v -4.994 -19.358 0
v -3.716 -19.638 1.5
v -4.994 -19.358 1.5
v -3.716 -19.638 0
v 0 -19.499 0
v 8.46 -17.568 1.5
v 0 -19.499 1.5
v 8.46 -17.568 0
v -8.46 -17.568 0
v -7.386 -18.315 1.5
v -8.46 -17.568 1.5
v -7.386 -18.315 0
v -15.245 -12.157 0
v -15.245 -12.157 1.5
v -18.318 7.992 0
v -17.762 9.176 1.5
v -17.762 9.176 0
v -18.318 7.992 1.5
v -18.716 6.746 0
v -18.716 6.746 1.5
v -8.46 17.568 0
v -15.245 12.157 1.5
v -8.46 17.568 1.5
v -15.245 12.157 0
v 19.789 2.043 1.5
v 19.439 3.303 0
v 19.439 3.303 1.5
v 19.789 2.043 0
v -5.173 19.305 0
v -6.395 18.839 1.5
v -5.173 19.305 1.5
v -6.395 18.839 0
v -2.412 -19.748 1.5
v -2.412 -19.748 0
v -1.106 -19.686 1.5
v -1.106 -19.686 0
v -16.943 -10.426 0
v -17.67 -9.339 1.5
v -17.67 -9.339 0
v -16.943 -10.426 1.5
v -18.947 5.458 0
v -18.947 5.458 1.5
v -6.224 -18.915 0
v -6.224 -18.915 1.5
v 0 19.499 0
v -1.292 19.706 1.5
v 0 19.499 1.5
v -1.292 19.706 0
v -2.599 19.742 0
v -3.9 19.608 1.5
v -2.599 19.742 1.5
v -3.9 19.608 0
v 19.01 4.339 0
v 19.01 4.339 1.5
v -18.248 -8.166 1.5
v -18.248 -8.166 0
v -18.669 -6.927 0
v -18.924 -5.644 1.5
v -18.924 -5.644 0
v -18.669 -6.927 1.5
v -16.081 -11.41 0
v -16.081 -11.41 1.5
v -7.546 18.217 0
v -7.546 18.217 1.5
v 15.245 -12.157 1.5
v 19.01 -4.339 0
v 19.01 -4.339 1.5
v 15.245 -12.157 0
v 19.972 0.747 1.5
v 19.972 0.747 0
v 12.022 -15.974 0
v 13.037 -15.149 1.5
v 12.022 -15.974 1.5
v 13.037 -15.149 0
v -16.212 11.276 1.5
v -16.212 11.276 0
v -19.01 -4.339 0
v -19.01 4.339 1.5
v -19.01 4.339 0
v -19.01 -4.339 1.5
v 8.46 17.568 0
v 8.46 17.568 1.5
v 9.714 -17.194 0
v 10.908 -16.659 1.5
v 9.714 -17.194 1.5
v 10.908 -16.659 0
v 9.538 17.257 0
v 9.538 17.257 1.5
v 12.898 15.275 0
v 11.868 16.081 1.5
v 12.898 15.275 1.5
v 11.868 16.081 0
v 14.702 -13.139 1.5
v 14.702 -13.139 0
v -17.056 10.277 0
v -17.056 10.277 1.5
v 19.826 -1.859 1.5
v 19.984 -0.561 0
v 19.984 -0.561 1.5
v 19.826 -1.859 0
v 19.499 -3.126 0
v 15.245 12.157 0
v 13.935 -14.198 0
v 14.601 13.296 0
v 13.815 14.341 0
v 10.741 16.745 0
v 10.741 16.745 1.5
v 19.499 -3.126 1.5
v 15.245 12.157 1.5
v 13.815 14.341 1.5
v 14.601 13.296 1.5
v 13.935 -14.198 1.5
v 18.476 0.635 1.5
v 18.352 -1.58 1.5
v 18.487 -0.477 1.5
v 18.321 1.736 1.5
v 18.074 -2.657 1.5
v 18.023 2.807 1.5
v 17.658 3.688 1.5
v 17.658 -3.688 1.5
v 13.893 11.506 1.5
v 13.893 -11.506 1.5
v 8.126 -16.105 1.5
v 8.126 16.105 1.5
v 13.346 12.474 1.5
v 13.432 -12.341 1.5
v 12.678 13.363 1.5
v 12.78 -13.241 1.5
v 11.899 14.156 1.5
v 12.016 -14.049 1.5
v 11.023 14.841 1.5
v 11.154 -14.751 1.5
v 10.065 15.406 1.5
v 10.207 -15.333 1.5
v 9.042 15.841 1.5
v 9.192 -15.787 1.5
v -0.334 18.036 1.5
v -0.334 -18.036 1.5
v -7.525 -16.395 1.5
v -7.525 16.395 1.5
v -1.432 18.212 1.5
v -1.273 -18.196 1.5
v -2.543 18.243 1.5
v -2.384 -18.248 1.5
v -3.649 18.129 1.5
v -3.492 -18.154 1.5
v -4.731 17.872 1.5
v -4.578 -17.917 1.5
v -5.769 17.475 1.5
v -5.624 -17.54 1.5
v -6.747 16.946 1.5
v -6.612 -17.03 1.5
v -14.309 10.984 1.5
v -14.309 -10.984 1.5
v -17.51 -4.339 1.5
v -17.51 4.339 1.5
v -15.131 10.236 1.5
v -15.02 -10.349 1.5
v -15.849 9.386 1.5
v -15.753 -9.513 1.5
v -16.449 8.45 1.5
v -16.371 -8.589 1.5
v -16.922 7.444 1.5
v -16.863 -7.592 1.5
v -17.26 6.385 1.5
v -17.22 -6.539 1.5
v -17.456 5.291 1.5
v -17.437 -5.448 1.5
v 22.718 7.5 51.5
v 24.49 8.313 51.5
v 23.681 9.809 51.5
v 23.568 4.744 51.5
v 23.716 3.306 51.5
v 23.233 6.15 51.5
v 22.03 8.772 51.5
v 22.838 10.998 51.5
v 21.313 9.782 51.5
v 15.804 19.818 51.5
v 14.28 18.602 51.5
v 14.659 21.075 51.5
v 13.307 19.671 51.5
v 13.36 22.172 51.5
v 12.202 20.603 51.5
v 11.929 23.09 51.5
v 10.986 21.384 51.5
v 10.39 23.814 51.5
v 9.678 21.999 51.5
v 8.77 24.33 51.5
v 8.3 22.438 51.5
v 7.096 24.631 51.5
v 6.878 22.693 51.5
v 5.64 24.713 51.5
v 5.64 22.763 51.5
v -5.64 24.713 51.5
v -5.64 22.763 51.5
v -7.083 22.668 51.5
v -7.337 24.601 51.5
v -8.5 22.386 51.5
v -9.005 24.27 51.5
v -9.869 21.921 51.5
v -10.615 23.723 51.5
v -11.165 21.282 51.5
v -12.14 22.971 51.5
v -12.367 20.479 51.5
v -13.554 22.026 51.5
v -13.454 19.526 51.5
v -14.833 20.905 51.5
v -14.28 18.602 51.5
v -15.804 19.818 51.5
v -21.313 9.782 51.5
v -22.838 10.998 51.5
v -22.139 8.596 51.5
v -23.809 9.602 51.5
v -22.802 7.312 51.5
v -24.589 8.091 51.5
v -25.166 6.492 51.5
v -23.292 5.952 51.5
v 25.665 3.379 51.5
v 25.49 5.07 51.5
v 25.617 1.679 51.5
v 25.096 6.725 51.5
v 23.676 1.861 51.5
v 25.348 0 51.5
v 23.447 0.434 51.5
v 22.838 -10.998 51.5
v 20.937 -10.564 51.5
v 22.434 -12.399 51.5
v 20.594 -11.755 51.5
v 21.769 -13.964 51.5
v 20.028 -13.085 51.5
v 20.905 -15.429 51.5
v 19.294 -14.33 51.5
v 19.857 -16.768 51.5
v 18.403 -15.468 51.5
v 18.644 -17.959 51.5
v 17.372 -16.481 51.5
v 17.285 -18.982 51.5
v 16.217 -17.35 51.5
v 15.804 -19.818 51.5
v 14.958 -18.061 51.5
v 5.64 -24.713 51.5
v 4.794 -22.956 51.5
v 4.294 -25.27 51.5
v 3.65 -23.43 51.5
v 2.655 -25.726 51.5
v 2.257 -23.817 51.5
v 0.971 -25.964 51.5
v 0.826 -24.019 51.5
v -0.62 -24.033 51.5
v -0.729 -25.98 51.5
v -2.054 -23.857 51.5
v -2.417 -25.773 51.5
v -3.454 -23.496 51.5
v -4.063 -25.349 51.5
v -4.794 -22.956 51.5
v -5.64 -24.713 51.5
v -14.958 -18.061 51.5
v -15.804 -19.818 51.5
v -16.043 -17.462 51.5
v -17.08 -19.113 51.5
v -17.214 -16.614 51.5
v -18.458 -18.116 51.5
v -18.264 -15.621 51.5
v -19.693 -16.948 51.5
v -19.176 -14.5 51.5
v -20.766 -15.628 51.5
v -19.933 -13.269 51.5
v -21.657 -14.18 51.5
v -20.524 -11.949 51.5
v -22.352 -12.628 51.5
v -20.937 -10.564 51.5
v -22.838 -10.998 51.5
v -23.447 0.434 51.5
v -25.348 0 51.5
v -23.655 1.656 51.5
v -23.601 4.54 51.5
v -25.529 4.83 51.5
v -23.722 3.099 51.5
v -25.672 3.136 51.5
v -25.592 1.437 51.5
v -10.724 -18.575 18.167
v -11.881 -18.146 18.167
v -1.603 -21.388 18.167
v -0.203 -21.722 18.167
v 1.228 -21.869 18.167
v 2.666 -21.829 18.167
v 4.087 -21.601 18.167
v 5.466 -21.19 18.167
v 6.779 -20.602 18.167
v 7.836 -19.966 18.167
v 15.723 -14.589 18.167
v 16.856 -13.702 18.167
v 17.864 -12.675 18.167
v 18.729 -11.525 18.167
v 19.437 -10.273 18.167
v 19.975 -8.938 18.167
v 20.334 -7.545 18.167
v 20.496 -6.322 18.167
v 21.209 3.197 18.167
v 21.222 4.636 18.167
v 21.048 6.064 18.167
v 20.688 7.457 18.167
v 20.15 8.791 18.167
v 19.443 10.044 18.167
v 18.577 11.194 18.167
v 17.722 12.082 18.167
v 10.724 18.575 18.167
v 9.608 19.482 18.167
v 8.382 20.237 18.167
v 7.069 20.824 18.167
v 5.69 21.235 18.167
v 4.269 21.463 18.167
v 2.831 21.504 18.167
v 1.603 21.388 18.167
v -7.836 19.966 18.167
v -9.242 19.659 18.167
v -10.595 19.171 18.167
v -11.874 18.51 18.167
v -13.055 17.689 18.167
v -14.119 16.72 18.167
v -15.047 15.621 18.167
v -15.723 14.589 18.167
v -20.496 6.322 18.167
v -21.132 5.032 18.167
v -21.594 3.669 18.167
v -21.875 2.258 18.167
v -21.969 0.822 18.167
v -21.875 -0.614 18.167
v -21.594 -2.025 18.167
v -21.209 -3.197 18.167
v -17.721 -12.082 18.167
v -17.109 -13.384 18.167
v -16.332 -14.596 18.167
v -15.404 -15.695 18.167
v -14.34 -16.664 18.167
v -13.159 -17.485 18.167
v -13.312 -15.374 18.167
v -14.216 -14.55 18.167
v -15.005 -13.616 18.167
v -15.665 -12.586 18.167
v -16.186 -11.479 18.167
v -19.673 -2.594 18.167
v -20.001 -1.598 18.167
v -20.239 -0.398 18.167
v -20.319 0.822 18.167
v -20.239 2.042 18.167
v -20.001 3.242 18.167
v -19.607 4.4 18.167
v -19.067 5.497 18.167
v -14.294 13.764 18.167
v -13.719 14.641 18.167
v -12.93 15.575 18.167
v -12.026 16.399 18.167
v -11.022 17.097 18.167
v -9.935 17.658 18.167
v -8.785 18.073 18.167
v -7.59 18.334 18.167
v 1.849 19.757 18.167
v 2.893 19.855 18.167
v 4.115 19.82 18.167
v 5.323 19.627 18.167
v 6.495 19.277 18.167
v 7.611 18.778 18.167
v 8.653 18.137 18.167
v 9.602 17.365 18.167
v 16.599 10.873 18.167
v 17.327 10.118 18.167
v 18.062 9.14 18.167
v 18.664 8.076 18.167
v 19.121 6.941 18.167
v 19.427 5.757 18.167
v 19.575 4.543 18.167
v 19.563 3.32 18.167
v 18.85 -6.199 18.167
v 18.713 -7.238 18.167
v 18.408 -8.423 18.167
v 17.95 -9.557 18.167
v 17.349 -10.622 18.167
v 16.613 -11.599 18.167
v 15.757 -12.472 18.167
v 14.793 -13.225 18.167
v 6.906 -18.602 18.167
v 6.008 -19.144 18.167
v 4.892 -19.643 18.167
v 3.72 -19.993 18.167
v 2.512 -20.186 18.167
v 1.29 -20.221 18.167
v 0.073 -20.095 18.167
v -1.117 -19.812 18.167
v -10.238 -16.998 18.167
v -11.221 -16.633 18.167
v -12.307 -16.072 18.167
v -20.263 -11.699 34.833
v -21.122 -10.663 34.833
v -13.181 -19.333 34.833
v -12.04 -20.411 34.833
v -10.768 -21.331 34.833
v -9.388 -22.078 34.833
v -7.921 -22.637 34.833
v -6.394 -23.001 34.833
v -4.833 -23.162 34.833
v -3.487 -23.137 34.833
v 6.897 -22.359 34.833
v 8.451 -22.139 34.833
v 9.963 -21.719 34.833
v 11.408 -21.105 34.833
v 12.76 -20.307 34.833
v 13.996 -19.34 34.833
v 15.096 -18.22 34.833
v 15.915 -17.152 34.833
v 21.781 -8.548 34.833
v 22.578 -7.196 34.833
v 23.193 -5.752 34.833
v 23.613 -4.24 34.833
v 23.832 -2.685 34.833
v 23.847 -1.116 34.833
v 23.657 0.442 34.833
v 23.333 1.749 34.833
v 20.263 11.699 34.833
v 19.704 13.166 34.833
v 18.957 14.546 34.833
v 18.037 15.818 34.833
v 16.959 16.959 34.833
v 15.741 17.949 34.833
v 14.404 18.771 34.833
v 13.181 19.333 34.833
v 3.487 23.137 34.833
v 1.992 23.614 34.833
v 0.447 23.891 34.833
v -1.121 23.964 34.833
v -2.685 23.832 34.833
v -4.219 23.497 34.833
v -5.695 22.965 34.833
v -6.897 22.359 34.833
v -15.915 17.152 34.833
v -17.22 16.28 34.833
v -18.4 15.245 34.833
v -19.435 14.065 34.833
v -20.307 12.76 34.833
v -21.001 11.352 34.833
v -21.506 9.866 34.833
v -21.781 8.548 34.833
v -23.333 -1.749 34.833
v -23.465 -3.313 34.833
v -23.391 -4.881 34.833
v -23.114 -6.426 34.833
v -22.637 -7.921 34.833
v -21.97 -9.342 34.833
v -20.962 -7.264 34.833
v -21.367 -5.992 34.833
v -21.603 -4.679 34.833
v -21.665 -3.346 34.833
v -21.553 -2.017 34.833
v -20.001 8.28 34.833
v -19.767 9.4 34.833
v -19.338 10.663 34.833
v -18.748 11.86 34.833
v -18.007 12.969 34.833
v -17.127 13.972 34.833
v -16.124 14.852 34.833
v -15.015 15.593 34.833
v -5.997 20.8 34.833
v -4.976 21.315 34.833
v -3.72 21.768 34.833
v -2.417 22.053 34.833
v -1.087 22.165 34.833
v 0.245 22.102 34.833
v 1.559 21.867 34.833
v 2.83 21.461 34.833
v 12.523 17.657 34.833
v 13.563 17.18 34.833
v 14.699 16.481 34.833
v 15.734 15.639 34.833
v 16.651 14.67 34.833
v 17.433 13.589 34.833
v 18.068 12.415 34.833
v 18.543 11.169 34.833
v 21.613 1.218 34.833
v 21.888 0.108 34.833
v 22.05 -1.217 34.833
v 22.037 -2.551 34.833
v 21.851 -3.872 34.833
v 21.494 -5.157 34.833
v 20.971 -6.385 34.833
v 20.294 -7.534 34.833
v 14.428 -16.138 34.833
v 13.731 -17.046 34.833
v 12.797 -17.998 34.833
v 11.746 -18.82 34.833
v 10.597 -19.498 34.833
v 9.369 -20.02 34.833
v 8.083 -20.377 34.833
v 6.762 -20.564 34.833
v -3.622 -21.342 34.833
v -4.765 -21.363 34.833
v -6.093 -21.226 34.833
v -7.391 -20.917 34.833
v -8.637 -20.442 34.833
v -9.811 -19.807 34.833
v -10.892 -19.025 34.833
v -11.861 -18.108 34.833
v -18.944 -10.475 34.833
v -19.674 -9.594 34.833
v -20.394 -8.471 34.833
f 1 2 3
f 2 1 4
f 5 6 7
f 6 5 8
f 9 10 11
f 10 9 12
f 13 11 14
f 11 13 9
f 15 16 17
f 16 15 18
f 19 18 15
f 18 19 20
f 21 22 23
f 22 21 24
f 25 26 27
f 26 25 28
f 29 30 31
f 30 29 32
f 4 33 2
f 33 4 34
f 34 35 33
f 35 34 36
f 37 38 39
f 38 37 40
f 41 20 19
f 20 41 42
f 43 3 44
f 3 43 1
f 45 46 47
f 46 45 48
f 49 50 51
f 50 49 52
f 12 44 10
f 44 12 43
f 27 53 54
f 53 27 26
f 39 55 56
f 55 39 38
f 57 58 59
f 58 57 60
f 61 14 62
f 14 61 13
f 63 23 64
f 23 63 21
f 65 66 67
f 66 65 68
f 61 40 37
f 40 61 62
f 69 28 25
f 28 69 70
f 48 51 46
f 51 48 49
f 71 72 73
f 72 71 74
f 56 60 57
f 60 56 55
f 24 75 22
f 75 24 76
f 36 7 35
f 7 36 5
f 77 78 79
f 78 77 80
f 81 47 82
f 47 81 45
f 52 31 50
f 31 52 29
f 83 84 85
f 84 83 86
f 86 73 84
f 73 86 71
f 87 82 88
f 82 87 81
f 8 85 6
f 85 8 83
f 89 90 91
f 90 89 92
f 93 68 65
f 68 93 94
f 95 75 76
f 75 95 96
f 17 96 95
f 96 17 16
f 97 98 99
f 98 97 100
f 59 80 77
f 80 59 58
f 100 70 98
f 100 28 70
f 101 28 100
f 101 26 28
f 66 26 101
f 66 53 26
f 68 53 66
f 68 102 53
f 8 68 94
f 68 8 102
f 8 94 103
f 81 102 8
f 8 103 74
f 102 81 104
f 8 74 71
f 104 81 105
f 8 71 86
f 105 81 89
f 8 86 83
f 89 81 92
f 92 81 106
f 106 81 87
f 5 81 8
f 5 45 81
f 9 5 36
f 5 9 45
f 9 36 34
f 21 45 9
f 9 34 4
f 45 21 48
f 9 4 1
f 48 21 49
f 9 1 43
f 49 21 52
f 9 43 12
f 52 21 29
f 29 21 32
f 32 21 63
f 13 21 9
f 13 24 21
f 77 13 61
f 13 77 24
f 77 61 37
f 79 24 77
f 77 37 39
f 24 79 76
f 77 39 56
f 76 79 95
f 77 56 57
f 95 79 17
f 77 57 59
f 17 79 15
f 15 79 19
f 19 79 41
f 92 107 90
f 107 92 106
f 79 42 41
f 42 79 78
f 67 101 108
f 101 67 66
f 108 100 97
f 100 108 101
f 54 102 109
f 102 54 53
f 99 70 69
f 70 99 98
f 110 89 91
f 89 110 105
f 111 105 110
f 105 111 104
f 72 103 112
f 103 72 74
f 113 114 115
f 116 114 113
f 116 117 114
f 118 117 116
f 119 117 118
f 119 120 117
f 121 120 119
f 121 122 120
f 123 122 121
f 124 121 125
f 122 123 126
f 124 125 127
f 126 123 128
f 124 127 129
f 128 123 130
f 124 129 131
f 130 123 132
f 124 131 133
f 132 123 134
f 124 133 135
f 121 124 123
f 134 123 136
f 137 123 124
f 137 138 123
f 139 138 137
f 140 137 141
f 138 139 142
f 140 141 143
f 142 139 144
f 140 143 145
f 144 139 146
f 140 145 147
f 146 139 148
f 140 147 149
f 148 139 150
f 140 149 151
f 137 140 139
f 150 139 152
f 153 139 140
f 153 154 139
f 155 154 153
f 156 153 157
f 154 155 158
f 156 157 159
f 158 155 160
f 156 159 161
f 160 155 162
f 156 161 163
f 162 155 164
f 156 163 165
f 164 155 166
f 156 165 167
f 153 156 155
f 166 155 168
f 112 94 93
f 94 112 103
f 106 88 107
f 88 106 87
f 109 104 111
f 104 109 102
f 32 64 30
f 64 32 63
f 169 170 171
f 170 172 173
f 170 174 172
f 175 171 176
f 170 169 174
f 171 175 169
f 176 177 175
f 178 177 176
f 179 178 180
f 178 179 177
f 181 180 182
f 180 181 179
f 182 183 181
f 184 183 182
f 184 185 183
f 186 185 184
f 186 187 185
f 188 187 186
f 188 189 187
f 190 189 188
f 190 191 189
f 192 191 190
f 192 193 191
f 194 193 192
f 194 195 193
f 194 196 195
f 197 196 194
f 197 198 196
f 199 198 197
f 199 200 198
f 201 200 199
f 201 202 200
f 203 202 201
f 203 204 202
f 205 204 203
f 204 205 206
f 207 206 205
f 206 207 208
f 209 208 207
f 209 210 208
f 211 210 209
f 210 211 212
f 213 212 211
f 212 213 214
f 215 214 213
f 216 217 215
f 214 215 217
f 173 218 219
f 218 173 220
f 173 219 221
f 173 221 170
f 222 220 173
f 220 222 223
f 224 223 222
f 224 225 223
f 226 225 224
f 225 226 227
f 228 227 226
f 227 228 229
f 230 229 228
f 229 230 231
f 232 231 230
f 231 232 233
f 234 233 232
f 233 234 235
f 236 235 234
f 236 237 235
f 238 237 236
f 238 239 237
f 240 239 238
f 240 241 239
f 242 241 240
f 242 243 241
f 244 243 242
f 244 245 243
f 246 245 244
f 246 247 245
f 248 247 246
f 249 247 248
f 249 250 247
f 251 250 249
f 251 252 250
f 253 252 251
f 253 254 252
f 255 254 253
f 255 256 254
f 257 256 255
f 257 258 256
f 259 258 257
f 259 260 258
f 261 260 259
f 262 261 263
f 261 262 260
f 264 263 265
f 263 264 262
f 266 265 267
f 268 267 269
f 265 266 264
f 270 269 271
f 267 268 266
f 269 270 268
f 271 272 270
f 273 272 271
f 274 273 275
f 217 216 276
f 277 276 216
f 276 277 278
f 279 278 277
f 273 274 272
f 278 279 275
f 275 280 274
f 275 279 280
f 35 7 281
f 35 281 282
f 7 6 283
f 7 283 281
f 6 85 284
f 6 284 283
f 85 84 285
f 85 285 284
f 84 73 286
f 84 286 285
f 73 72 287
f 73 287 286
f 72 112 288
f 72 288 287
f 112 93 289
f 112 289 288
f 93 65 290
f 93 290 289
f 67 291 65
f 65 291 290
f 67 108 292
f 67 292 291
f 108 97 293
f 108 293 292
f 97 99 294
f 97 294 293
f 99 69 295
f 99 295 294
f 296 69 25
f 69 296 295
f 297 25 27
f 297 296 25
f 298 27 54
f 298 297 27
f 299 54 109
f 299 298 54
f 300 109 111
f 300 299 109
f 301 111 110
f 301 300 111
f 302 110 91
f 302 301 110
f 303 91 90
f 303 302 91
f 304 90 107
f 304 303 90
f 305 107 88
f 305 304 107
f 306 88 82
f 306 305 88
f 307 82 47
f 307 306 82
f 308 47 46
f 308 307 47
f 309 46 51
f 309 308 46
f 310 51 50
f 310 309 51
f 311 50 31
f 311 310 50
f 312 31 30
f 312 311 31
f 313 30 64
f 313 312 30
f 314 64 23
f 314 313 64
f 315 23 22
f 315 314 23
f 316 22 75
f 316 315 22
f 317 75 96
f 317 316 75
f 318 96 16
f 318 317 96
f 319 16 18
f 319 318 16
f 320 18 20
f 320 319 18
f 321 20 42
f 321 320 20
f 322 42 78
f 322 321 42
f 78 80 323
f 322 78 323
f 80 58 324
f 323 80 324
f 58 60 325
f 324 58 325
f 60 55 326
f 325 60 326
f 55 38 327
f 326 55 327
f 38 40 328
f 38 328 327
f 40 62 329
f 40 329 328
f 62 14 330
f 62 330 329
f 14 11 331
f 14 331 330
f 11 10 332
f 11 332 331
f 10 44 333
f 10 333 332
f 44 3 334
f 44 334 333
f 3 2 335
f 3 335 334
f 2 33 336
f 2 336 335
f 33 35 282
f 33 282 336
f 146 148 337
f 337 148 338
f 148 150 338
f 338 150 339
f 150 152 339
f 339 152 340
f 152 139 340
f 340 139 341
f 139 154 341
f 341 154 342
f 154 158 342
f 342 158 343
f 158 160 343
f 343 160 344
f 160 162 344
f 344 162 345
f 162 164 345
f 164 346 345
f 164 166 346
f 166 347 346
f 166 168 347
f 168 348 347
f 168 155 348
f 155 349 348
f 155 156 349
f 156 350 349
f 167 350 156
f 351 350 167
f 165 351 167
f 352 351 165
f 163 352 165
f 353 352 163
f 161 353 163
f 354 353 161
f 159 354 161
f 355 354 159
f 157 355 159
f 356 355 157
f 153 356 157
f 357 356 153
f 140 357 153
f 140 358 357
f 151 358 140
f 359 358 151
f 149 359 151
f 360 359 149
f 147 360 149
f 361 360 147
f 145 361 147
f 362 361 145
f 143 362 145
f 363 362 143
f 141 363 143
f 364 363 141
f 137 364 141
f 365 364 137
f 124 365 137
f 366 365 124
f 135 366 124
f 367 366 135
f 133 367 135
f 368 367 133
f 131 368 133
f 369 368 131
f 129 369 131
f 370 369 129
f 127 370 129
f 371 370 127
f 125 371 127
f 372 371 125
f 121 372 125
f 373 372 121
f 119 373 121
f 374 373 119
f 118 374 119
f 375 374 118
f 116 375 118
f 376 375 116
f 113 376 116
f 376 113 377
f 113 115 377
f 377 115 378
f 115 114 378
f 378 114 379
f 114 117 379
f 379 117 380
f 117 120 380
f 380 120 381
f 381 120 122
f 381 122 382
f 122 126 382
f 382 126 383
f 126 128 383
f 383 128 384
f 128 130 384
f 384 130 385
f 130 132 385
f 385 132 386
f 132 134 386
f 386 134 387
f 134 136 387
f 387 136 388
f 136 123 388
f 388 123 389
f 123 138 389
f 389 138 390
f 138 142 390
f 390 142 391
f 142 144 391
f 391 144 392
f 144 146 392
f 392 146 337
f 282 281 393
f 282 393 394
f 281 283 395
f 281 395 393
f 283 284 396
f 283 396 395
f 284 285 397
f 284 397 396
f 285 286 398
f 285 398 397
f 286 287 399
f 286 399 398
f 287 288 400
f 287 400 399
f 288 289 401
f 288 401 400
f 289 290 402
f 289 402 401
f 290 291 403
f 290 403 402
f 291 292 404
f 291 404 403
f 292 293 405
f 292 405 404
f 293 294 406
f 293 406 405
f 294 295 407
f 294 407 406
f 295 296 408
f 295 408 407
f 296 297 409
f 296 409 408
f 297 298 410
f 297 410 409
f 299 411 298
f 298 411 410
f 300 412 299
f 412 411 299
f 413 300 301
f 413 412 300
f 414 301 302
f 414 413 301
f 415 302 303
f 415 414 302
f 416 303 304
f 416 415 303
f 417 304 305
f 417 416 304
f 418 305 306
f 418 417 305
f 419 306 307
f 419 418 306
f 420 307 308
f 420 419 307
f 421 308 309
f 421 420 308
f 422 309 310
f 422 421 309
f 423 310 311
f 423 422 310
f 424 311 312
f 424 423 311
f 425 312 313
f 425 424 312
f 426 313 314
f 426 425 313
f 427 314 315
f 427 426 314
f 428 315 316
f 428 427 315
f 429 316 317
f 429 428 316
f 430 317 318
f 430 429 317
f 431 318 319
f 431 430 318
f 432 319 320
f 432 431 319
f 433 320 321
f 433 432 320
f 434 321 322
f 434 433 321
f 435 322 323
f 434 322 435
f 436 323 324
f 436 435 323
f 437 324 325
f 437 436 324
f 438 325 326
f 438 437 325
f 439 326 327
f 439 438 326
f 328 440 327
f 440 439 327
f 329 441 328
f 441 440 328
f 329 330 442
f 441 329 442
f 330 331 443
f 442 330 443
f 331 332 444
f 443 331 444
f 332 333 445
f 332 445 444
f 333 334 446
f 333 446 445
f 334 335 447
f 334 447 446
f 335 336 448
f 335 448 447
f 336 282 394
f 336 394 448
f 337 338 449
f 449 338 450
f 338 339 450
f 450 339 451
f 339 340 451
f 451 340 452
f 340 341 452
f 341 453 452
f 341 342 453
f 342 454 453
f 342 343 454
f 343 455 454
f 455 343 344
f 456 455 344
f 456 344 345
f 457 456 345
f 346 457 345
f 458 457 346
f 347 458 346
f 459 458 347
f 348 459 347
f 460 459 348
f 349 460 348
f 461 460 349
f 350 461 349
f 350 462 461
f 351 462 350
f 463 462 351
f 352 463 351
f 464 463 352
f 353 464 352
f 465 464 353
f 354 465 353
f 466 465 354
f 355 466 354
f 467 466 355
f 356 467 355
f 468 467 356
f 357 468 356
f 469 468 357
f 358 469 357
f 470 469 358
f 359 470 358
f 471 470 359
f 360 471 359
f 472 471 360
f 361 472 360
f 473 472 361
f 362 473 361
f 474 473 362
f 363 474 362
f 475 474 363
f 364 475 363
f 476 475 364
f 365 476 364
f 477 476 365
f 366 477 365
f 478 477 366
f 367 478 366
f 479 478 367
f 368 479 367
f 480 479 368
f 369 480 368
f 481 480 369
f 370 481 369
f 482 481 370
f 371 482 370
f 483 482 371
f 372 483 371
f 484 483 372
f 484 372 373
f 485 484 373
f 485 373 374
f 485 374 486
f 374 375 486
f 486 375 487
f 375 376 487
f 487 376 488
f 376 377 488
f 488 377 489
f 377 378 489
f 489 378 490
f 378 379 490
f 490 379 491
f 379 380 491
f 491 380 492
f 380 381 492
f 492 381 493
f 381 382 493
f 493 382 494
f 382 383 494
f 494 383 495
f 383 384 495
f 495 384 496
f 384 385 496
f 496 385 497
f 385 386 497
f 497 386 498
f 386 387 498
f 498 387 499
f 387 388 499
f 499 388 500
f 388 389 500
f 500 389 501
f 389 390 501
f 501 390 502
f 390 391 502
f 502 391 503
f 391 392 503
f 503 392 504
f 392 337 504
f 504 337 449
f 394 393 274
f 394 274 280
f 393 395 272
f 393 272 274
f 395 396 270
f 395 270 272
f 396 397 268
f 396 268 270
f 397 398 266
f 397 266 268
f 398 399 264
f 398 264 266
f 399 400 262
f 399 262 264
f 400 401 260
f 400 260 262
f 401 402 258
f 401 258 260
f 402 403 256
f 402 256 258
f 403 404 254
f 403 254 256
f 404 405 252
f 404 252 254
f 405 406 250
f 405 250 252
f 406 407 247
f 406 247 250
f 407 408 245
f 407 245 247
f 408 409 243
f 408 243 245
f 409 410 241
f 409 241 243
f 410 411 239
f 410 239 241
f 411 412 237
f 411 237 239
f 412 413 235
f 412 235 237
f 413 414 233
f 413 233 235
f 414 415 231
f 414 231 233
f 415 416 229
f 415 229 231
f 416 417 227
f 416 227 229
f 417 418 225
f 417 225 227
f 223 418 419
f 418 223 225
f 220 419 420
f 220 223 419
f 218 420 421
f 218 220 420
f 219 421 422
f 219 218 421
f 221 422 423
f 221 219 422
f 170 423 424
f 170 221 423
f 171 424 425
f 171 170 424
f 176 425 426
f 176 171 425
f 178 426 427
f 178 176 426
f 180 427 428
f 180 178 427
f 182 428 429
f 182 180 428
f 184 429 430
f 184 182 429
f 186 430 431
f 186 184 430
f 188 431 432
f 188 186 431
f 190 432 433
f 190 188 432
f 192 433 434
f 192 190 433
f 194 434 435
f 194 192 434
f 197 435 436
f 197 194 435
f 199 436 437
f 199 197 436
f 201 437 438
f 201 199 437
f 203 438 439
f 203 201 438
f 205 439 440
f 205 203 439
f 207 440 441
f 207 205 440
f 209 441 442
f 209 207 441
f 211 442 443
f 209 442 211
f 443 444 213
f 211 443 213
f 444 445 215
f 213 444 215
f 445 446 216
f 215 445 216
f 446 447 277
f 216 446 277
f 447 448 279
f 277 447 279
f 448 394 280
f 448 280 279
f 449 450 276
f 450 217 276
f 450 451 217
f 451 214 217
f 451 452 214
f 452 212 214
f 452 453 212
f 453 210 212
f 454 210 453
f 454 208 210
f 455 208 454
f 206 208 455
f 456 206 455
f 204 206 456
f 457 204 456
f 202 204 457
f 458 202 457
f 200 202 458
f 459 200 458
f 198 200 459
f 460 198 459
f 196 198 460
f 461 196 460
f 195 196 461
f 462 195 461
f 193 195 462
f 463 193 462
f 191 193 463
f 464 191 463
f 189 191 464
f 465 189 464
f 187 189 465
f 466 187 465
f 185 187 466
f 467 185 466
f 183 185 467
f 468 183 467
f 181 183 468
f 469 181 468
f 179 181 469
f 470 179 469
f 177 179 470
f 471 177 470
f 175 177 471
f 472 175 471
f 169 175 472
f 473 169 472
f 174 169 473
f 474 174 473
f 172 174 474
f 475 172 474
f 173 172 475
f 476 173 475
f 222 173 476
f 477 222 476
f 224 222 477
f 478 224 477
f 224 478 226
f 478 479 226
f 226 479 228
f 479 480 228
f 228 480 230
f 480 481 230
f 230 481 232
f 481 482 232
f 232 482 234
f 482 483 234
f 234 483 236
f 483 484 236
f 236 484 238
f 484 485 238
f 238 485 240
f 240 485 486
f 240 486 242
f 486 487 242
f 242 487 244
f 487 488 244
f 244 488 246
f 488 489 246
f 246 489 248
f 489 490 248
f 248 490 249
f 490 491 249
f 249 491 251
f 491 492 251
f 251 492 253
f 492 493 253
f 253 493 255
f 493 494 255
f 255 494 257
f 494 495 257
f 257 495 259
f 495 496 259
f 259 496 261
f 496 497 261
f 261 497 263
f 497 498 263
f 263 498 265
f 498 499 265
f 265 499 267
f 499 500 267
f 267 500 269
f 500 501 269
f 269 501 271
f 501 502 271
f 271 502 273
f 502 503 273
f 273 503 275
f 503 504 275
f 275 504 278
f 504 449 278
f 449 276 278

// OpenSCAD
//Simple Bowl

radius = 10;//bowl radius
side = 7;//bowl side
hole = 5.5;
//take away soild's thickness
thickness = side - hole;

h = 50;
//body height

BodyS = "no";
BaseS = "yes";
//inside soild="yes" or "no"

bodyTwist = 90;
//twist angle

bodySlices = 3;
//smoothe

bodyScale = 1.3;
//scale

baseHeight = 1.5;



//$fn : fixed number of fragments in 360 degrees.

//Offset allows moving 2D outlines outward or inward by a given amount.

/////////////////////////////////
//Render

//Base
linear_extrude(height = baseHeight)
{
    Bowl(BaseS);
}

//Body
translate([0,0,baseHeight])
  linear_extrude(height = h , twist =  bodyTwist ,slices = bodySlices , scale = bodyScale )
  {
    Bowl(BodyS);
  }




////////////////////////////////
module Bowl(soild){
  difference()
  {
    //start outside shape
    offset(r = radius ,$fn = 48)
    {
      circle(r = radius,$fn = side);
    }
    //take away inside shape
    if(soild == "no")
    {
      offset(r = radius-thickness ,$fn = 48)
      {
        circle(r = radius,$fn = side);
      }
    }
    
  }
}
